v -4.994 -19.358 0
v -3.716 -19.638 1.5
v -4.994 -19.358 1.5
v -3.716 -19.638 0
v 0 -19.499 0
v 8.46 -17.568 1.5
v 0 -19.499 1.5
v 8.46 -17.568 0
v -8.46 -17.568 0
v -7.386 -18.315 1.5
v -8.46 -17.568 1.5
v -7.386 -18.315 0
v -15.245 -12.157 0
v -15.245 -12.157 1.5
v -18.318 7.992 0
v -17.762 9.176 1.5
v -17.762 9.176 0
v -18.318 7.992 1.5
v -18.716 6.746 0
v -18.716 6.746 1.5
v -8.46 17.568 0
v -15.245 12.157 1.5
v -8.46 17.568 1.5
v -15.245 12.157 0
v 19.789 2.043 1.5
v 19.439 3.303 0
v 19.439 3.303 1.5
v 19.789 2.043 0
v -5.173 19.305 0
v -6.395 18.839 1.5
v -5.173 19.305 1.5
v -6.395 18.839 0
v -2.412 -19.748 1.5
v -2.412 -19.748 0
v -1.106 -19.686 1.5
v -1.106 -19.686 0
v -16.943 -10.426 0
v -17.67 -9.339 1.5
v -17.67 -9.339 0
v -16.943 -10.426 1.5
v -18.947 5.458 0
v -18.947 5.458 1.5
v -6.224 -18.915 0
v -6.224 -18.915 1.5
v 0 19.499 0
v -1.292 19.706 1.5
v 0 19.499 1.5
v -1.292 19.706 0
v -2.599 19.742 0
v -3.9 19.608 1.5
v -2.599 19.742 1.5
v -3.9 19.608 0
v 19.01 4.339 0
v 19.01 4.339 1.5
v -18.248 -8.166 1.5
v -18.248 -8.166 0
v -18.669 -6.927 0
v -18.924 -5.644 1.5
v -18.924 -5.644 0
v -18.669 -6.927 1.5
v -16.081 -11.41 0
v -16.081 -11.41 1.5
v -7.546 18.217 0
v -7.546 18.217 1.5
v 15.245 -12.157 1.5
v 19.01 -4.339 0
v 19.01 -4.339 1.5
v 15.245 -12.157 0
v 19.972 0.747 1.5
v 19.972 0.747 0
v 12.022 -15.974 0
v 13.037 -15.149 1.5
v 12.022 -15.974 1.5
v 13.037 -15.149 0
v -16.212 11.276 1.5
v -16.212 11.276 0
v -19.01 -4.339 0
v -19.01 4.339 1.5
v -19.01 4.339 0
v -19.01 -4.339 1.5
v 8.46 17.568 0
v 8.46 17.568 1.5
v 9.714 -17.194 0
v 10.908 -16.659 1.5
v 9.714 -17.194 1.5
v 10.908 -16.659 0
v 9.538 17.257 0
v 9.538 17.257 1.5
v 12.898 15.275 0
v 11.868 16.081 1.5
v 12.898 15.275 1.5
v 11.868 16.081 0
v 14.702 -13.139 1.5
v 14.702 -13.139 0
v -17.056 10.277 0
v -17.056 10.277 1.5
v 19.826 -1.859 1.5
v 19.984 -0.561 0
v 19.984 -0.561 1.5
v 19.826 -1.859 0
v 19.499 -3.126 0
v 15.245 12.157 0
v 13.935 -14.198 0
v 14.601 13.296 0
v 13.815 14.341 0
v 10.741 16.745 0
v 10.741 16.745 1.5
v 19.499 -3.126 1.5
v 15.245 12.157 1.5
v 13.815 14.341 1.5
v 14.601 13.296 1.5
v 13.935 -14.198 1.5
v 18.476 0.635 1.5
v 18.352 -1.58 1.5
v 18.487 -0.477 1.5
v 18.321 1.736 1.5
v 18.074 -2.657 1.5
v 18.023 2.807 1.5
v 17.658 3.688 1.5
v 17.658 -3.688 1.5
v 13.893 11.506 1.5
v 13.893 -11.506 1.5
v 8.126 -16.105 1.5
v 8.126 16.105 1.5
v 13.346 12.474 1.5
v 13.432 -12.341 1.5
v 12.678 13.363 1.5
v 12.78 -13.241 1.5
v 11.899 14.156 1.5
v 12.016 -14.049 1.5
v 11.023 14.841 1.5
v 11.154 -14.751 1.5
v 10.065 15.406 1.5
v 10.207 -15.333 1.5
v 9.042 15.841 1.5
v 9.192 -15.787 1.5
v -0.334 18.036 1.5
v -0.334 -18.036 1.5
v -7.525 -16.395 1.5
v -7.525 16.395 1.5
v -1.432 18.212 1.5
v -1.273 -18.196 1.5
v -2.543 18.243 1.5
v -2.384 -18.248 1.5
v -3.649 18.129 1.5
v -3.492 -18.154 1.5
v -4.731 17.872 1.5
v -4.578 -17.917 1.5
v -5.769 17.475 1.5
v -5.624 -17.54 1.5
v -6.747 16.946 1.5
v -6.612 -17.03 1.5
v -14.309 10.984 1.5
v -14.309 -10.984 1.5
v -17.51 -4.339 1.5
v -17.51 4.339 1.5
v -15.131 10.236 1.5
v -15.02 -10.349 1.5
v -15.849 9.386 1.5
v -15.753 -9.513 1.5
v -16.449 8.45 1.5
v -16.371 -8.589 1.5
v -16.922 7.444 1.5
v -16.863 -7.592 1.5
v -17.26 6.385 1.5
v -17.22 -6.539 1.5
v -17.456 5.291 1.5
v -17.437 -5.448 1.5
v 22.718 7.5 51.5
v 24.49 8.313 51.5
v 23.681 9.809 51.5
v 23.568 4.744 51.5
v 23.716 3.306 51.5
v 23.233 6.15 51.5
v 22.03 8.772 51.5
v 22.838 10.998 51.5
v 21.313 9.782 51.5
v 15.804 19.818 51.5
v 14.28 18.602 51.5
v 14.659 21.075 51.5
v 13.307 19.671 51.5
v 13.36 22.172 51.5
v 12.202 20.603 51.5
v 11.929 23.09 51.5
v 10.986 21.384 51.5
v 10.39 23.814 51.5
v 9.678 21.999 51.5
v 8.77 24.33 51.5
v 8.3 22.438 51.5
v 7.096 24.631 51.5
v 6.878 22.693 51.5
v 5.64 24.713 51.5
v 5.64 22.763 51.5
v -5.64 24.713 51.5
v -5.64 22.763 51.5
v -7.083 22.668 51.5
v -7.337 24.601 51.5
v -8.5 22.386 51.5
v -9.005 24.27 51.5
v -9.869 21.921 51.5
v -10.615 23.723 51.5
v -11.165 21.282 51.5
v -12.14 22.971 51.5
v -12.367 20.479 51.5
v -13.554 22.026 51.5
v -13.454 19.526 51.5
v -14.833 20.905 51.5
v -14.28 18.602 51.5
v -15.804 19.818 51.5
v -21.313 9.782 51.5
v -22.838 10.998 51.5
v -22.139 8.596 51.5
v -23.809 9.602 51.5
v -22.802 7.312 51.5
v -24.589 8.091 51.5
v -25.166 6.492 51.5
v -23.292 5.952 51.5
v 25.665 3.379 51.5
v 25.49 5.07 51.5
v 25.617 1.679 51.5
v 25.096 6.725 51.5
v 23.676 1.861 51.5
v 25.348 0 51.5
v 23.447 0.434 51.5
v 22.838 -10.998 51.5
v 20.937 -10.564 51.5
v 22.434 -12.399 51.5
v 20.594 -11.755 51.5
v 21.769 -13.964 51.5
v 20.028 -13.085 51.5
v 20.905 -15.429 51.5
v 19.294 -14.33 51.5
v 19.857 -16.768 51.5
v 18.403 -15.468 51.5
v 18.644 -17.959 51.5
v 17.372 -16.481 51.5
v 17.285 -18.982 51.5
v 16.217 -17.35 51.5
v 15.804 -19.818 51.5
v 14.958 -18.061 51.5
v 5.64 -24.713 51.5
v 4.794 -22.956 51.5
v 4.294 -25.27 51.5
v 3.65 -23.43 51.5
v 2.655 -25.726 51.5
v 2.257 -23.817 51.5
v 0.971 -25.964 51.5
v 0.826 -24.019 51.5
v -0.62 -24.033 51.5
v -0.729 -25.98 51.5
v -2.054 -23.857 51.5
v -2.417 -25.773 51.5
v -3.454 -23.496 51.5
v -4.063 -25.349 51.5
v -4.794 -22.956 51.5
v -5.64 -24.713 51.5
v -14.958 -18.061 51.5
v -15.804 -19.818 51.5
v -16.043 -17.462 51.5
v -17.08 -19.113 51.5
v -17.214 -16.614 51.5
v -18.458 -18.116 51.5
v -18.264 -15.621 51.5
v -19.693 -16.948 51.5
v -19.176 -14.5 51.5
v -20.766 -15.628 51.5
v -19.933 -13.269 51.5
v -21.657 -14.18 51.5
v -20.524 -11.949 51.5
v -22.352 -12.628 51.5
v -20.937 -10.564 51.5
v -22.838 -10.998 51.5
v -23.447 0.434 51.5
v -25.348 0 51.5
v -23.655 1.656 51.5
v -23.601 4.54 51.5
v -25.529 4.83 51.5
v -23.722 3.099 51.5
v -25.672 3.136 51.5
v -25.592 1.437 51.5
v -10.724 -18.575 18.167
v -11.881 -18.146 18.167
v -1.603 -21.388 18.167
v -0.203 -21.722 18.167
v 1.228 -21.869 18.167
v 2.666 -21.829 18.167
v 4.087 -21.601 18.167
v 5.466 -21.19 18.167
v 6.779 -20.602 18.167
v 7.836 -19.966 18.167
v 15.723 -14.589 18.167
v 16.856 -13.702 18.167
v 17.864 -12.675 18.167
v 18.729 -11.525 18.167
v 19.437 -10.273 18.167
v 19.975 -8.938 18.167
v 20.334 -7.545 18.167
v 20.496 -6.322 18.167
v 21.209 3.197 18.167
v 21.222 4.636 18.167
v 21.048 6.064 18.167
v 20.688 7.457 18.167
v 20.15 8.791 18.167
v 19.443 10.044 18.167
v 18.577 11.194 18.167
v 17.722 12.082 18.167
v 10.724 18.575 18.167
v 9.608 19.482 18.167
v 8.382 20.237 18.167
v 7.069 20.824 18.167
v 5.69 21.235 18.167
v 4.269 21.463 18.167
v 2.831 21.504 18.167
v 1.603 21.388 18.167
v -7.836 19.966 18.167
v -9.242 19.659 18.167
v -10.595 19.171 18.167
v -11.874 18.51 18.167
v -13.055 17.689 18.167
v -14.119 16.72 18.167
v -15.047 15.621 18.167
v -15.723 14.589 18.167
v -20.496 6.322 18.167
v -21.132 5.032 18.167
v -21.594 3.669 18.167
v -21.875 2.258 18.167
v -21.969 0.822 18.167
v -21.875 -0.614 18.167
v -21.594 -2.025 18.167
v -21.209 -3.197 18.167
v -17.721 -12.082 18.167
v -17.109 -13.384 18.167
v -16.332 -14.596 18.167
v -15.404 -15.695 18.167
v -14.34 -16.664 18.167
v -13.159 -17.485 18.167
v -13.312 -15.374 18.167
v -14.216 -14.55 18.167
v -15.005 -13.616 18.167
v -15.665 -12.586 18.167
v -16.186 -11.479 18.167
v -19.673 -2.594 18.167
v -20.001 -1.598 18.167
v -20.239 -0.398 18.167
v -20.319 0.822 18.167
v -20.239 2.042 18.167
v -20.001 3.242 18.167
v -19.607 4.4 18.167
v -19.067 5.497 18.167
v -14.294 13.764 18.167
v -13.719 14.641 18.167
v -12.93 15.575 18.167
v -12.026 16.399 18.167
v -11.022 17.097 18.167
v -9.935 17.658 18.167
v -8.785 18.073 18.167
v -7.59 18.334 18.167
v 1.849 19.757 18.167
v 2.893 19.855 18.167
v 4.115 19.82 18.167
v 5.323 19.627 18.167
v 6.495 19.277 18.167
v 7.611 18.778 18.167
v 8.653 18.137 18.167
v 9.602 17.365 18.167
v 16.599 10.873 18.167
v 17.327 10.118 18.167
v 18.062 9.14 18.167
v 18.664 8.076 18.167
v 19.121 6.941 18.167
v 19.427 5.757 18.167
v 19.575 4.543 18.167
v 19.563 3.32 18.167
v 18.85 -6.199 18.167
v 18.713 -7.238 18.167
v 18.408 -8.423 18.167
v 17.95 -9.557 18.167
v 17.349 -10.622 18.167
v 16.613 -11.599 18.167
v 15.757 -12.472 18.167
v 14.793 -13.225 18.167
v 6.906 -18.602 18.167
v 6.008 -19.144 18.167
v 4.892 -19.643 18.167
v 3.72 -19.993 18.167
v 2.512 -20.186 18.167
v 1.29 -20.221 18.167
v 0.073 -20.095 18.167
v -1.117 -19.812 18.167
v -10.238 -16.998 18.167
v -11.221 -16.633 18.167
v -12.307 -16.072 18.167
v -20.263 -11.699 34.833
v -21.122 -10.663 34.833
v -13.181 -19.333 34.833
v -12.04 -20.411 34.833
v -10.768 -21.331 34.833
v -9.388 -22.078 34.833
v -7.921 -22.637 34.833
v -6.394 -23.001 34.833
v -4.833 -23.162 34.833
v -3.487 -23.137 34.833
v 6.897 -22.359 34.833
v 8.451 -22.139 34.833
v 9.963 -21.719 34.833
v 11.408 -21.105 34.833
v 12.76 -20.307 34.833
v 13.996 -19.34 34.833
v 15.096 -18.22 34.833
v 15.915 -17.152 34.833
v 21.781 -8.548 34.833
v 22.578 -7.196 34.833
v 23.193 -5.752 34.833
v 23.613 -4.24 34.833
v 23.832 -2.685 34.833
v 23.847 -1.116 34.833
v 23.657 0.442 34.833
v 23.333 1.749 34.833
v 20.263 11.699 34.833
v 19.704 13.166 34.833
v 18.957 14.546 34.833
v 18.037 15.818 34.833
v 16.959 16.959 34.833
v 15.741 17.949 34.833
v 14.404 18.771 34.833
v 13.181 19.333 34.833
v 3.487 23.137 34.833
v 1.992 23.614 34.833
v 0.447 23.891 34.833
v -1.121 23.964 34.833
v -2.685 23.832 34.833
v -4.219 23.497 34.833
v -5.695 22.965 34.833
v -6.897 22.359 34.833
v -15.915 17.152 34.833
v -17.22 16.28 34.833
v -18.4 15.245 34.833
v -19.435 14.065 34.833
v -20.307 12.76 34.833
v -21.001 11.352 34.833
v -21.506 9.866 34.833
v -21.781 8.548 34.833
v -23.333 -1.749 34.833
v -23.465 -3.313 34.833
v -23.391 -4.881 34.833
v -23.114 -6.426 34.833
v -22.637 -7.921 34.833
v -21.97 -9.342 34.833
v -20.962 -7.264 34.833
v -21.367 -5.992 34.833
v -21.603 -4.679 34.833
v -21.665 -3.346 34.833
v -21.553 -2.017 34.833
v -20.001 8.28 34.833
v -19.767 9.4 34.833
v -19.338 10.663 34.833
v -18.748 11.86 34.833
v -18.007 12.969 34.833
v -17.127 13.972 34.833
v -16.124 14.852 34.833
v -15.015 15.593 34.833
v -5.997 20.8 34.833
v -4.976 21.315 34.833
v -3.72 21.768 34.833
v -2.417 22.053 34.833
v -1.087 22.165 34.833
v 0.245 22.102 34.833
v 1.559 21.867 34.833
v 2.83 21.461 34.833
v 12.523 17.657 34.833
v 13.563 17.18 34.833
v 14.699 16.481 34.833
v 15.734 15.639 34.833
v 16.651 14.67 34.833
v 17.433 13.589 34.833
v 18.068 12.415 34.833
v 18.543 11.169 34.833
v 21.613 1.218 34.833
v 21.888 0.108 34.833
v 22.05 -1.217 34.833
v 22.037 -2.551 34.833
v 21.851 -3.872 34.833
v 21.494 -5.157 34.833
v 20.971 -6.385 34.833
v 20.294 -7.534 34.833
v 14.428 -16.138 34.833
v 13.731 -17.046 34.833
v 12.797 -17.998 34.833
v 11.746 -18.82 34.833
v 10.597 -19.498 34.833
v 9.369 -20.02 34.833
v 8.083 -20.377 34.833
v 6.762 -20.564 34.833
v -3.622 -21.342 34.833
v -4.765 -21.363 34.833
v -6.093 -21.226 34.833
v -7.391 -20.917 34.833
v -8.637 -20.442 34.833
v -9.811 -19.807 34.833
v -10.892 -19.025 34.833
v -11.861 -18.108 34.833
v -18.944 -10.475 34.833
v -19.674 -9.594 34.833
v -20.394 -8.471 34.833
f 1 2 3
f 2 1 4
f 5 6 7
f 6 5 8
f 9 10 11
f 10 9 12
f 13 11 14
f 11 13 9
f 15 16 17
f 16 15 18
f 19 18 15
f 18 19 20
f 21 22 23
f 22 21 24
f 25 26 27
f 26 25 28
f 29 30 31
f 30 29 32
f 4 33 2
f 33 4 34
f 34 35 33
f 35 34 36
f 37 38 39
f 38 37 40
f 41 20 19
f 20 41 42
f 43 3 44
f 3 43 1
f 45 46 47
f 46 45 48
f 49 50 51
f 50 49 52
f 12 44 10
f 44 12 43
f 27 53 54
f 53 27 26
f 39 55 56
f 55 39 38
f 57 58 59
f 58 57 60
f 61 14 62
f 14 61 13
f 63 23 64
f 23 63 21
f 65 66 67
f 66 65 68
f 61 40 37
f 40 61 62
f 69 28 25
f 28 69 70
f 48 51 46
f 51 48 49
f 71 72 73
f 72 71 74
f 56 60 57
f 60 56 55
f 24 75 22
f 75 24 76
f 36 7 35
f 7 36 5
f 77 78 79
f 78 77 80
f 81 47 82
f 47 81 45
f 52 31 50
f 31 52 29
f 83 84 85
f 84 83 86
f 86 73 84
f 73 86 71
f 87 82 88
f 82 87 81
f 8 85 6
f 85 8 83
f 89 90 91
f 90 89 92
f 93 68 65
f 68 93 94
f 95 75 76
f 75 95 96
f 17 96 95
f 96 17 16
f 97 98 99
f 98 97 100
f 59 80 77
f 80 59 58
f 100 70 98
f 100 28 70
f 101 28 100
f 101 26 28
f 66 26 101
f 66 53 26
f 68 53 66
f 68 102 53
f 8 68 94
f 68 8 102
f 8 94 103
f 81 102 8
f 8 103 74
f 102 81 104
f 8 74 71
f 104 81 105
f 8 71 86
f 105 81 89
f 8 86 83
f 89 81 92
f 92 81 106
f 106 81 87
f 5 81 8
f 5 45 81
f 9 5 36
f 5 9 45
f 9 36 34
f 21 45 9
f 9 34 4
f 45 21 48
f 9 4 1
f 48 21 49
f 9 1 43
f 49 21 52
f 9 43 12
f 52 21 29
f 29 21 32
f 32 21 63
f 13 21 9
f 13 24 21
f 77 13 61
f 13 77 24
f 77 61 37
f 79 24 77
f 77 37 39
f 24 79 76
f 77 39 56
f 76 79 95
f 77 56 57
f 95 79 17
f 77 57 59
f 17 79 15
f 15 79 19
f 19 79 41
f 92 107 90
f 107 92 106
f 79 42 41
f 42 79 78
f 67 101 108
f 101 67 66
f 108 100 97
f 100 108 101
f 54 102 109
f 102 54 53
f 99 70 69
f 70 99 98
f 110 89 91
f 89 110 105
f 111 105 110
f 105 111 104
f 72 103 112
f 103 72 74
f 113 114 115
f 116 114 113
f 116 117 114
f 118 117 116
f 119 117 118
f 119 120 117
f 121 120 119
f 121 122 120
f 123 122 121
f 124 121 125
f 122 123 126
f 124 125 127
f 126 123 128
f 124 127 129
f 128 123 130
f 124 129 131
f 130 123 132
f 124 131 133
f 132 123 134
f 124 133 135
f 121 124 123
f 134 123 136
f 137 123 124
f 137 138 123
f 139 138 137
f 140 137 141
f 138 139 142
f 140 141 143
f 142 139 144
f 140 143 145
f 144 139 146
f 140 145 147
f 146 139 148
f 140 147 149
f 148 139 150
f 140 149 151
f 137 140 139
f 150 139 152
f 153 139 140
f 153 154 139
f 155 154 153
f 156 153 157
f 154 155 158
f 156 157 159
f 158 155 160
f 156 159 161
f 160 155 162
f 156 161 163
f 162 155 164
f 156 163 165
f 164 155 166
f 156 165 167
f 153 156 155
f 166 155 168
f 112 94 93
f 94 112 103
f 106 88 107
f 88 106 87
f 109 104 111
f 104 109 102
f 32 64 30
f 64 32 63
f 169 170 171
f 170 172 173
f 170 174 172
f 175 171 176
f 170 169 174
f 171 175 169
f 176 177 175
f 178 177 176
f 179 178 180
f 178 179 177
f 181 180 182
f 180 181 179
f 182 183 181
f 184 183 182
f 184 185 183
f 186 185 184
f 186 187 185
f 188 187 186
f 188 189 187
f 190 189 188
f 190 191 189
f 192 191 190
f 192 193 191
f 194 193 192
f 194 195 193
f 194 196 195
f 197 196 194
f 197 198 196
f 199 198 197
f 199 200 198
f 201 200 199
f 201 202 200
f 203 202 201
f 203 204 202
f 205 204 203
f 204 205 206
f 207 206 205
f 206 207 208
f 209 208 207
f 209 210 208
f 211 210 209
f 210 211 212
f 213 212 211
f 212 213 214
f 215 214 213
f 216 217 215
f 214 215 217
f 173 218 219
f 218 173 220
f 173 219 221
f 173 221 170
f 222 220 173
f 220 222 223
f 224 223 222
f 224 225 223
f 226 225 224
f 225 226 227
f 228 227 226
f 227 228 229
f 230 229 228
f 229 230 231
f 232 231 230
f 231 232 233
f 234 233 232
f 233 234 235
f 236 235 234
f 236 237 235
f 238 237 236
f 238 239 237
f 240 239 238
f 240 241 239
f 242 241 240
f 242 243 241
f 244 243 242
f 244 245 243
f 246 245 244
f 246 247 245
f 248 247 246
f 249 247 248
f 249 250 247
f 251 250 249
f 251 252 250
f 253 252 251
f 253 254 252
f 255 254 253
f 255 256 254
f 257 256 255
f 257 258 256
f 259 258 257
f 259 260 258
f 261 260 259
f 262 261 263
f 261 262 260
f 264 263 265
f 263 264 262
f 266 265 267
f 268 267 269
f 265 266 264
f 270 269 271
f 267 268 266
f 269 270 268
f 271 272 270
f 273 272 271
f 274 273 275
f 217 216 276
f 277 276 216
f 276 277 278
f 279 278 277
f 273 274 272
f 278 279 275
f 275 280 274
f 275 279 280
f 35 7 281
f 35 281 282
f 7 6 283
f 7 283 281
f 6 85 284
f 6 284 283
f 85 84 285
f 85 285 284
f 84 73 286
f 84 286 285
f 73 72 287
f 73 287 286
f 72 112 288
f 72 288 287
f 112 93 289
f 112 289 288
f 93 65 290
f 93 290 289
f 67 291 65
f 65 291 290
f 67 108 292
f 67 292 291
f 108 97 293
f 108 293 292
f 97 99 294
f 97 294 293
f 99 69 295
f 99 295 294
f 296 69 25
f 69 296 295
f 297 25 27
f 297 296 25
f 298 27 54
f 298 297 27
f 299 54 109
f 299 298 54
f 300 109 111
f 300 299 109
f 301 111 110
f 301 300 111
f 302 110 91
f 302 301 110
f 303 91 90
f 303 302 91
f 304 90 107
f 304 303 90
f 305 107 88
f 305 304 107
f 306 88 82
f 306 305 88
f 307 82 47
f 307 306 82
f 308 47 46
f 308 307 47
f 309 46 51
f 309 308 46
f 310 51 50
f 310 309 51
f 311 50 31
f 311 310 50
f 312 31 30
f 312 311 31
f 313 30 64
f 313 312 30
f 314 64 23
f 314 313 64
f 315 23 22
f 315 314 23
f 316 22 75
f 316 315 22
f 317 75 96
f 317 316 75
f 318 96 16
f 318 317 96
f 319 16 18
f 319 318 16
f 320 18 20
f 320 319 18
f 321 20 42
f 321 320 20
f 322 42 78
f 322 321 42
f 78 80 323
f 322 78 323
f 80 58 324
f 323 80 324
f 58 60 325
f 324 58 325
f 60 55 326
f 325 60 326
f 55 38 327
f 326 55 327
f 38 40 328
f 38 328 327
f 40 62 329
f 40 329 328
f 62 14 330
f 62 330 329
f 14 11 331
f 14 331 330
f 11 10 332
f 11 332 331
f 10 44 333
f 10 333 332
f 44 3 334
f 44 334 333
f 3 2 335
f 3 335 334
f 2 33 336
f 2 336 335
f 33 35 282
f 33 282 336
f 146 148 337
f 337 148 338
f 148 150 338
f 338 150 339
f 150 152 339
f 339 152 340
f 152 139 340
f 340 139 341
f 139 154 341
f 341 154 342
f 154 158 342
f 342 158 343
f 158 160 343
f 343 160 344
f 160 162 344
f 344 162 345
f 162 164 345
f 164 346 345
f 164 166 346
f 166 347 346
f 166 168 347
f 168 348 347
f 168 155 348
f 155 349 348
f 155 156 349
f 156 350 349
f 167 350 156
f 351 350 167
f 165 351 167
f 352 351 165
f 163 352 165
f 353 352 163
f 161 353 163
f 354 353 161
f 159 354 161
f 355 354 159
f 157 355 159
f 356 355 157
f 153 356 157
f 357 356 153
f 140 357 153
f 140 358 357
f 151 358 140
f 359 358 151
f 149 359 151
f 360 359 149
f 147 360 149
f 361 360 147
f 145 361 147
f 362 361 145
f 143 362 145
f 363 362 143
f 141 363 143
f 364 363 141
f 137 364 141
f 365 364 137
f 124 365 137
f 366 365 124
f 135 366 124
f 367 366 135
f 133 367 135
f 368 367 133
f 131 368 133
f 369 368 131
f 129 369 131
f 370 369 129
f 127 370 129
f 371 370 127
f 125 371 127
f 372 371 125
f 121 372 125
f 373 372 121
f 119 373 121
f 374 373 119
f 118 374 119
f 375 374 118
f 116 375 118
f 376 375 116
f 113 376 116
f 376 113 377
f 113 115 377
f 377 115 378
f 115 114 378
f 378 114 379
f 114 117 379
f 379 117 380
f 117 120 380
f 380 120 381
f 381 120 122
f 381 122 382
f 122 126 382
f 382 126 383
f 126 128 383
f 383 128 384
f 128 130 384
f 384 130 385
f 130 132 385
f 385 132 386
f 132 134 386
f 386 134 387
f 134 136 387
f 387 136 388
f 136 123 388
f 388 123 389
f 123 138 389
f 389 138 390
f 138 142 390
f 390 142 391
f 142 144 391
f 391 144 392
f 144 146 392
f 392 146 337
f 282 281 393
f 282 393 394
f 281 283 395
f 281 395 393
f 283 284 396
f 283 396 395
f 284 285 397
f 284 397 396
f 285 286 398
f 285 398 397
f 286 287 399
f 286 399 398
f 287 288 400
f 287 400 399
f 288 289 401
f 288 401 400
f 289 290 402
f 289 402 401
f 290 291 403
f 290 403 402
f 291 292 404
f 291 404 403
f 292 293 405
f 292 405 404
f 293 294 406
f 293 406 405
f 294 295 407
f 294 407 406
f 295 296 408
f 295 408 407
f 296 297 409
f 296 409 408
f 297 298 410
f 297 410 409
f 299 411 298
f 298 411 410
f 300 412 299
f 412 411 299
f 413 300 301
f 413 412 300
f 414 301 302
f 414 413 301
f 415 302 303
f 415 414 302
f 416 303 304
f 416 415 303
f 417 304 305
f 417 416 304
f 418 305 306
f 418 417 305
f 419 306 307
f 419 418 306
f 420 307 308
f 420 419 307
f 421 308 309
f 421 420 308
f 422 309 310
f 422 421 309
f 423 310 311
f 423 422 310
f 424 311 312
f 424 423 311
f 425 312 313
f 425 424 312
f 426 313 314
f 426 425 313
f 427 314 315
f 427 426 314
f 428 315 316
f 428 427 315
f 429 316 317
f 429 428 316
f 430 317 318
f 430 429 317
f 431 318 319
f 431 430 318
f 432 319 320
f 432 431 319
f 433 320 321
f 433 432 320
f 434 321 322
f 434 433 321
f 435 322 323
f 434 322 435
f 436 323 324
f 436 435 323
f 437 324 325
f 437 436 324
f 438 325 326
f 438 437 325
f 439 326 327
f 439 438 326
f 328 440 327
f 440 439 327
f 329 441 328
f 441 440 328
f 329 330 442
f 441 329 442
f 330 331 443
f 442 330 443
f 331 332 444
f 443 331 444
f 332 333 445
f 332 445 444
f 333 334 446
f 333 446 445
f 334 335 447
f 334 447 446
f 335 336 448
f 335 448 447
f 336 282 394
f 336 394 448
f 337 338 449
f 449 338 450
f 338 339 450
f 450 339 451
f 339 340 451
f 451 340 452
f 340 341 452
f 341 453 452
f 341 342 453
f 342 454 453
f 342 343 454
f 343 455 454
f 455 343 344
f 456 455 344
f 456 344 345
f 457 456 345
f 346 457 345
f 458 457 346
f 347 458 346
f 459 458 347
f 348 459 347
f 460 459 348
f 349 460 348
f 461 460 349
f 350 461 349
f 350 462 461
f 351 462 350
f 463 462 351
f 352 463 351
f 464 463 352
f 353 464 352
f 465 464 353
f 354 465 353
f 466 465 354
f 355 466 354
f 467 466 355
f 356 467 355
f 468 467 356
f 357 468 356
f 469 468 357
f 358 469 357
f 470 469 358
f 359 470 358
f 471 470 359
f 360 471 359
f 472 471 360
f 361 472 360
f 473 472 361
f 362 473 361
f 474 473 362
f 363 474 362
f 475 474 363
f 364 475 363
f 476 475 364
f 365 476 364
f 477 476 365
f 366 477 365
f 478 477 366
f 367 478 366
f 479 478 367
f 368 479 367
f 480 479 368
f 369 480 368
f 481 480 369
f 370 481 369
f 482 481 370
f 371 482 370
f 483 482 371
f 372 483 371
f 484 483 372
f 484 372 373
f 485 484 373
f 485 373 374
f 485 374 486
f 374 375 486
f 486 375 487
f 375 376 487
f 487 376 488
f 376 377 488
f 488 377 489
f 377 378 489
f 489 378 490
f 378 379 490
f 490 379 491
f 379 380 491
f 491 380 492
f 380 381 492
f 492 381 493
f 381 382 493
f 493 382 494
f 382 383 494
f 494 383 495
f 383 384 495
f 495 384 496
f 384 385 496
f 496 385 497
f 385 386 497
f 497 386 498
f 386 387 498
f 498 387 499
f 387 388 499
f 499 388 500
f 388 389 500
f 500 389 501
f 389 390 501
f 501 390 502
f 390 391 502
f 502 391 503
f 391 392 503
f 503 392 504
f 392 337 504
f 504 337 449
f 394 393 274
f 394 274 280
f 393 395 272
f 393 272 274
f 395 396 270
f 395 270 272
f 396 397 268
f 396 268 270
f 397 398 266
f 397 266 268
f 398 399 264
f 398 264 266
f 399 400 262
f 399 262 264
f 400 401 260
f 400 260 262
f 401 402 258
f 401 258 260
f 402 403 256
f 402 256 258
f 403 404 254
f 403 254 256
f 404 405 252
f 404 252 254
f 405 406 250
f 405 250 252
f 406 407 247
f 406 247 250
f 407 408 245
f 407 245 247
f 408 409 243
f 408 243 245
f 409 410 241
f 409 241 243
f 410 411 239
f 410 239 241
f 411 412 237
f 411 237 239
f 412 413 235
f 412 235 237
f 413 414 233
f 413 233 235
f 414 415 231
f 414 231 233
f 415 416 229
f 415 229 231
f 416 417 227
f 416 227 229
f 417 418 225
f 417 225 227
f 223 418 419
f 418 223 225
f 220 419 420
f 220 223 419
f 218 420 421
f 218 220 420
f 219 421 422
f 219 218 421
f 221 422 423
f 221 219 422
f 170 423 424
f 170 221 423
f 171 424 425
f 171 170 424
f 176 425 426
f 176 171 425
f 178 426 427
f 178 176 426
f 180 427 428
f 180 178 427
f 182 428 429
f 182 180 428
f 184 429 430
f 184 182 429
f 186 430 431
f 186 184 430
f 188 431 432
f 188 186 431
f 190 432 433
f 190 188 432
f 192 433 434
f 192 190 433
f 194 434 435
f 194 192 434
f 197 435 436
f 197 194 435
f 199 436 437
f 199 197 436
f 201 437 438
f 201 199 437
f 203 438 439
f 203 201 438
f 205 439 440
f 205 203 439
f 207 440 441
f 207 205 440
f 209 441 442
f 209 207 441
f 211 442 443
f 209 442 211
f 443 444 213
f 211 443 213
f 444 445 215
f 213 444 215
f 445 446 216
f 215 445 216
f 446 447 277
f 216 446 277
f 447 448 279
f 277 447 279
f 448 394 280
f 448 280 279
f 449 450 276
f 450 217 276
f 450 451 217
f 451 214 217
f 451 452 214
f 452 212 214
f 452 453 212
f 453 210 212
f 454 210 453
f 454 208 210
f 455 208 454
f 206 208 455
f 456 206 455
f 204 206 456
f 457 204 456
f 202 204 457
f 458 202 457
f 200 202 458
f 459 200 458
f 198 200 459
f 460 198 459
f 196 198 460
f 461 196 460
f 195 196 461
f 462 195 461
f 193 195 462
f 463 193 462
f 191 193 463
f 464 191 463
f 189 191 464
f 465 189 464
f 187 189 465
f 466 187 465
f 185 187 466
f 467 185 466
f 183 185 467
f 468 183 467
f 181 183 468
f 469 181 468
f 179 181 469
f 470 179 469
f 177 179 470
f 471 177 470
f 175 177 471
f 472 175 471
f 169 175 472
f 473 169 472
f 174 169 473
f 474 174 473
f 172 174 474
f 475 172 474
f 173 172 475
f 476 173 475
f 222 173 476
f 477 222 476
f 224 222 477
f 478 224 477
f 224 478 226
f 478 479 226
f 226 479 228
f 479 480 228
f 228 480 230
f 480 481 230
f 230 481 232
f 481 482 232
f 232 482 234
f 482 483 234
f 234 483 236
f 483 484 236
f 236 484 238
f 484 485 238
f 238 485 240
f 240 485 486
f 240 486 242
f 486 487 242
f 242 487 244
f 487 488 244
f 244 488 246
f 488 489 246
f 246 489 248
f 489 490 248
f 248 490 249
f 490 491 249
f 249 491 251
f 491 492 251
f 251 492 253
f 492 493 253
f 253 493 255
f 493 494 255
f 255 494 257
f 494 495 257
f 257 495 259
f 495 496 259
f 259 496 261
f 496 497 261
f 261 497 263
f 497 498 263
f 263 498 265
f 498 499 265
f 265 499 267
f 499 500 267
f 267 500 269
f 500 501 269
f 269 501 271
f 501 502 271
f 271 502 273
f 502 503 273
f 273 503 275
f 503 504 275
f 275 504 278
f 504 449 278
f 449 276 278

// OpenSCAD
//Simple Bowl

radius = 10;//bowl radius
side = 7;//bowl side
hole = 5.5;
//take away soild's thickness
thickness = side - hole;

h = 50;
//body height

BodyS = "no";
BaseS = "yes";
//inside soild="yes" or "no"

bodyTwist = 90;
//twist angle

bodySlices = 3;
//smoothe

bodyScale = 1.3;
//scale

baseHeight = 1.5;



//$fn : fixed number of fragments in 360 degrees.

//Offset allows moving 2D outlines outward or inward by a given amount.

/////////////////////////////////
//Render

//Base
linear_extrude(height = baseHeight)
{
    Bowl(BaseS);
}

//Body
translate([0,0,baseHeight])
  linear_extrude(height = h , twist =  bodyTwist ,slices = bodySlices , scale = bodyScale )
  {
    Bowl(BodyS);
  }




////////////////////////////////
module Bowl(soild){
  difference()
  {
    //start outside shape
    offset(r = radius ,$fn = 48)
    {
      circle(r = radius,$fn = side);
    }
    //take away inside shape
    if(soild == "no")
    {
      offset(r = radius-thickness ,$fn = 48)
      {
        circle(r = radius,$fn = side);
      }
    }
    
  }
}
